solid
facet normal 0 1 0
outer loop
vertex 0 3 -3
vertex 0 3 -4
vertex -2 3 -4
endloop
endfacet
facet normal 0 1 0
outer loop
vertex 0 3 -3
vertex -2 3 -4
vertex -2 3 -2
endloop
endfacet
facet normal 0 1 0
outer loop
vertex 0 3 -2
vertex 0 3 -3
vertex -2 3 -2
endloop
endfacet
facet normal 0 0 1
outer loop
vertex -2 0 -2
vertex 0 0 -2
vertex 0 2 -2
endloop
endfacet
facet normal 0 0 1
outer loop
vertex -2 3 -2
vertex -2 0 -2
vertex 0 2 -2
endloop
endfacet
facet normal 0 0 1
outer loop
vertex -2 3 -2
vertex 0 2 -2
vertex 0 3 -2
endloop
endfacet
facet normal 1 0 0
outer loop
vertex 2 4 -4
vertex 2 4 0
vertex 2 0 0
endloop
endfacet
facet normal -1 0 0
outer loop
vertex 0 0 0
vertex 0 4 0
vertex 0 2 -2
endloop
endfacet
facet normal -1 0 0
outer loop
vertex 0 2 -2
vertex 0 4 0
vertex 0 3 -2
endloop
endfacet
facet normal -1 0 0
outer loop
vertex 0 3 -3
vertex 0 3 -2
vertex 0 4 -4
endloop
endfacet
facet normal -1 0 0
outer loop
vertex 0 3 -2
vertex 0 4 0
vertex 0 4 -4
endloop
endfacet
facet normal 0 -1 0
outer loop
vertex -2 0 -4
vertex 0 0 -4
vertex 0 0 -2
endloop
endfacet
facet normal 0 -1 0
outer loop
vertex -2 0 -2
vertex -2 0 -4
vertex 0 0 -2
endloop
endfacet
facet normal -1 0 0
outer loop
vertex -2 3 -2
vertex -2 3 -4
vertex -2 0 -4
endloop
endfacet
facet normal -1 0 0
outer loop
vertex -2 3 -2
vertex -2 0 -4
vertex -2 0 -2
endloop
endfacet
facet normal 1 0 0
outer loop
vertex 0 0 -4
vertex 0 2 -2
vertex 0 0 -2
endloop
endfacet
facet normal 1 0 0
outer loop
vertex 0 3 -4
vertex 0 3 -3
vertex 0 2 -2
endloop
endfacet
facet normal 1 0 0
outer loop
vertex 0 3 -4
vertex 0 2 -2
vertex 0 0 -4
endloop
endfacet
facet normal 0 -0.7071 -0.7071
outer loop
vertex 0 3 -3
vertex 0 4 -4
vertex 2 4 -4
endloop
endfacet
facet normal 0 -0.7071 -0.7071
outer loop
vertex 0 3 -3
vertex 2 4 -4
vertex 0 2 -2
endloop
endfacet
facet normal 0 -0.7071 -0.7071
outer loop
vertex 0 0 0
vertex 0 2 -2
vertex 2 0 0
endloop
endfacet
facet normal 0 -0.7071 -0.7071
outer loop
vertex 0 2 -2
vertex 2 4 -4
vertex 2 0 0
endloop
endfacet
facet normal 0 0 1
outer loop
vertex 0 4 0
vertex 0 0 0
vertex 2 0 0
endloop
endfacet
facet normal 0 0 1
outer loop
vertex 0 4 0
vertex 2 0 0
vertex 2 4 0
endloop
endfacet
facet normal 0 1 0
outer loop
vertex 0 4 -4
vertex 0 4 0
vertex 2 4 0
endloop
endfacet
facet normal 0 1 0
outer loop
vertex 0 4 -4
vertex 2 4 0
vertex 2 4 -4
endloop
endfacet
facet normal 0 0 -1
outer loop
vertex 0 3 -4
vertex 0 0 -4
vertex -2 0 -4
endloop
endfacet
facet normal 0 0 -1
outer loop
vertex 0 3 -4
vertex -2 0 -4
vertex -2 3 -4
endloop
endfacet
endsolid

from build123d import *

# Parameters (mm, degrees)
SKETCH1_W           = 4
SKETCH1_H           = 4
BOSS_EXTRUDE1_DEPTH = 2
SKETCH2_W           = 2
SKETCH2_H           = 3
BOSS_EXTRUDE2_DEPTH = 2
CUT_EXTRUDE1_DEPTH  = 2


with BuildPart() as part:
    # Sketch1 → Boss-Extrude1 (new body)
    with BuildSketch(Plane(origin=(0, 0, 0), x_dir=(0, 0, -1), z_dir=(1, 0, 0))):
        with Locations((2, 2)):
            Rectangle(SKETCH1_W, SKETCH1_H)
    extrude(amount=BOSS_EXTRUDE1_DEPTH)

    # Sketch2 → Boss-Extrude2 (add)
    with BuildSketch(Plane.ZY):
        with Locations((-3, 1.5)):
            Rectangle(SKETCH2_W, SKETCH2_H)
    extrude(amount=BOSS_EXTRUDE2_DEPTH)

    # Sketch3 → Cut-Extrude1 (cut)
    with BuildSketch(Plane(origin=(2, 0, 0), x_dir=(0, 0, -1), z_dir=(1, 0, 0))):
        Polygon((4, 4), (0, 0), (4, 0), align=None)
    extrude(amount=-CUT_EXTRUDE1_DEPTH, mode=Mode.SUBTRACT)


solid = part.part
